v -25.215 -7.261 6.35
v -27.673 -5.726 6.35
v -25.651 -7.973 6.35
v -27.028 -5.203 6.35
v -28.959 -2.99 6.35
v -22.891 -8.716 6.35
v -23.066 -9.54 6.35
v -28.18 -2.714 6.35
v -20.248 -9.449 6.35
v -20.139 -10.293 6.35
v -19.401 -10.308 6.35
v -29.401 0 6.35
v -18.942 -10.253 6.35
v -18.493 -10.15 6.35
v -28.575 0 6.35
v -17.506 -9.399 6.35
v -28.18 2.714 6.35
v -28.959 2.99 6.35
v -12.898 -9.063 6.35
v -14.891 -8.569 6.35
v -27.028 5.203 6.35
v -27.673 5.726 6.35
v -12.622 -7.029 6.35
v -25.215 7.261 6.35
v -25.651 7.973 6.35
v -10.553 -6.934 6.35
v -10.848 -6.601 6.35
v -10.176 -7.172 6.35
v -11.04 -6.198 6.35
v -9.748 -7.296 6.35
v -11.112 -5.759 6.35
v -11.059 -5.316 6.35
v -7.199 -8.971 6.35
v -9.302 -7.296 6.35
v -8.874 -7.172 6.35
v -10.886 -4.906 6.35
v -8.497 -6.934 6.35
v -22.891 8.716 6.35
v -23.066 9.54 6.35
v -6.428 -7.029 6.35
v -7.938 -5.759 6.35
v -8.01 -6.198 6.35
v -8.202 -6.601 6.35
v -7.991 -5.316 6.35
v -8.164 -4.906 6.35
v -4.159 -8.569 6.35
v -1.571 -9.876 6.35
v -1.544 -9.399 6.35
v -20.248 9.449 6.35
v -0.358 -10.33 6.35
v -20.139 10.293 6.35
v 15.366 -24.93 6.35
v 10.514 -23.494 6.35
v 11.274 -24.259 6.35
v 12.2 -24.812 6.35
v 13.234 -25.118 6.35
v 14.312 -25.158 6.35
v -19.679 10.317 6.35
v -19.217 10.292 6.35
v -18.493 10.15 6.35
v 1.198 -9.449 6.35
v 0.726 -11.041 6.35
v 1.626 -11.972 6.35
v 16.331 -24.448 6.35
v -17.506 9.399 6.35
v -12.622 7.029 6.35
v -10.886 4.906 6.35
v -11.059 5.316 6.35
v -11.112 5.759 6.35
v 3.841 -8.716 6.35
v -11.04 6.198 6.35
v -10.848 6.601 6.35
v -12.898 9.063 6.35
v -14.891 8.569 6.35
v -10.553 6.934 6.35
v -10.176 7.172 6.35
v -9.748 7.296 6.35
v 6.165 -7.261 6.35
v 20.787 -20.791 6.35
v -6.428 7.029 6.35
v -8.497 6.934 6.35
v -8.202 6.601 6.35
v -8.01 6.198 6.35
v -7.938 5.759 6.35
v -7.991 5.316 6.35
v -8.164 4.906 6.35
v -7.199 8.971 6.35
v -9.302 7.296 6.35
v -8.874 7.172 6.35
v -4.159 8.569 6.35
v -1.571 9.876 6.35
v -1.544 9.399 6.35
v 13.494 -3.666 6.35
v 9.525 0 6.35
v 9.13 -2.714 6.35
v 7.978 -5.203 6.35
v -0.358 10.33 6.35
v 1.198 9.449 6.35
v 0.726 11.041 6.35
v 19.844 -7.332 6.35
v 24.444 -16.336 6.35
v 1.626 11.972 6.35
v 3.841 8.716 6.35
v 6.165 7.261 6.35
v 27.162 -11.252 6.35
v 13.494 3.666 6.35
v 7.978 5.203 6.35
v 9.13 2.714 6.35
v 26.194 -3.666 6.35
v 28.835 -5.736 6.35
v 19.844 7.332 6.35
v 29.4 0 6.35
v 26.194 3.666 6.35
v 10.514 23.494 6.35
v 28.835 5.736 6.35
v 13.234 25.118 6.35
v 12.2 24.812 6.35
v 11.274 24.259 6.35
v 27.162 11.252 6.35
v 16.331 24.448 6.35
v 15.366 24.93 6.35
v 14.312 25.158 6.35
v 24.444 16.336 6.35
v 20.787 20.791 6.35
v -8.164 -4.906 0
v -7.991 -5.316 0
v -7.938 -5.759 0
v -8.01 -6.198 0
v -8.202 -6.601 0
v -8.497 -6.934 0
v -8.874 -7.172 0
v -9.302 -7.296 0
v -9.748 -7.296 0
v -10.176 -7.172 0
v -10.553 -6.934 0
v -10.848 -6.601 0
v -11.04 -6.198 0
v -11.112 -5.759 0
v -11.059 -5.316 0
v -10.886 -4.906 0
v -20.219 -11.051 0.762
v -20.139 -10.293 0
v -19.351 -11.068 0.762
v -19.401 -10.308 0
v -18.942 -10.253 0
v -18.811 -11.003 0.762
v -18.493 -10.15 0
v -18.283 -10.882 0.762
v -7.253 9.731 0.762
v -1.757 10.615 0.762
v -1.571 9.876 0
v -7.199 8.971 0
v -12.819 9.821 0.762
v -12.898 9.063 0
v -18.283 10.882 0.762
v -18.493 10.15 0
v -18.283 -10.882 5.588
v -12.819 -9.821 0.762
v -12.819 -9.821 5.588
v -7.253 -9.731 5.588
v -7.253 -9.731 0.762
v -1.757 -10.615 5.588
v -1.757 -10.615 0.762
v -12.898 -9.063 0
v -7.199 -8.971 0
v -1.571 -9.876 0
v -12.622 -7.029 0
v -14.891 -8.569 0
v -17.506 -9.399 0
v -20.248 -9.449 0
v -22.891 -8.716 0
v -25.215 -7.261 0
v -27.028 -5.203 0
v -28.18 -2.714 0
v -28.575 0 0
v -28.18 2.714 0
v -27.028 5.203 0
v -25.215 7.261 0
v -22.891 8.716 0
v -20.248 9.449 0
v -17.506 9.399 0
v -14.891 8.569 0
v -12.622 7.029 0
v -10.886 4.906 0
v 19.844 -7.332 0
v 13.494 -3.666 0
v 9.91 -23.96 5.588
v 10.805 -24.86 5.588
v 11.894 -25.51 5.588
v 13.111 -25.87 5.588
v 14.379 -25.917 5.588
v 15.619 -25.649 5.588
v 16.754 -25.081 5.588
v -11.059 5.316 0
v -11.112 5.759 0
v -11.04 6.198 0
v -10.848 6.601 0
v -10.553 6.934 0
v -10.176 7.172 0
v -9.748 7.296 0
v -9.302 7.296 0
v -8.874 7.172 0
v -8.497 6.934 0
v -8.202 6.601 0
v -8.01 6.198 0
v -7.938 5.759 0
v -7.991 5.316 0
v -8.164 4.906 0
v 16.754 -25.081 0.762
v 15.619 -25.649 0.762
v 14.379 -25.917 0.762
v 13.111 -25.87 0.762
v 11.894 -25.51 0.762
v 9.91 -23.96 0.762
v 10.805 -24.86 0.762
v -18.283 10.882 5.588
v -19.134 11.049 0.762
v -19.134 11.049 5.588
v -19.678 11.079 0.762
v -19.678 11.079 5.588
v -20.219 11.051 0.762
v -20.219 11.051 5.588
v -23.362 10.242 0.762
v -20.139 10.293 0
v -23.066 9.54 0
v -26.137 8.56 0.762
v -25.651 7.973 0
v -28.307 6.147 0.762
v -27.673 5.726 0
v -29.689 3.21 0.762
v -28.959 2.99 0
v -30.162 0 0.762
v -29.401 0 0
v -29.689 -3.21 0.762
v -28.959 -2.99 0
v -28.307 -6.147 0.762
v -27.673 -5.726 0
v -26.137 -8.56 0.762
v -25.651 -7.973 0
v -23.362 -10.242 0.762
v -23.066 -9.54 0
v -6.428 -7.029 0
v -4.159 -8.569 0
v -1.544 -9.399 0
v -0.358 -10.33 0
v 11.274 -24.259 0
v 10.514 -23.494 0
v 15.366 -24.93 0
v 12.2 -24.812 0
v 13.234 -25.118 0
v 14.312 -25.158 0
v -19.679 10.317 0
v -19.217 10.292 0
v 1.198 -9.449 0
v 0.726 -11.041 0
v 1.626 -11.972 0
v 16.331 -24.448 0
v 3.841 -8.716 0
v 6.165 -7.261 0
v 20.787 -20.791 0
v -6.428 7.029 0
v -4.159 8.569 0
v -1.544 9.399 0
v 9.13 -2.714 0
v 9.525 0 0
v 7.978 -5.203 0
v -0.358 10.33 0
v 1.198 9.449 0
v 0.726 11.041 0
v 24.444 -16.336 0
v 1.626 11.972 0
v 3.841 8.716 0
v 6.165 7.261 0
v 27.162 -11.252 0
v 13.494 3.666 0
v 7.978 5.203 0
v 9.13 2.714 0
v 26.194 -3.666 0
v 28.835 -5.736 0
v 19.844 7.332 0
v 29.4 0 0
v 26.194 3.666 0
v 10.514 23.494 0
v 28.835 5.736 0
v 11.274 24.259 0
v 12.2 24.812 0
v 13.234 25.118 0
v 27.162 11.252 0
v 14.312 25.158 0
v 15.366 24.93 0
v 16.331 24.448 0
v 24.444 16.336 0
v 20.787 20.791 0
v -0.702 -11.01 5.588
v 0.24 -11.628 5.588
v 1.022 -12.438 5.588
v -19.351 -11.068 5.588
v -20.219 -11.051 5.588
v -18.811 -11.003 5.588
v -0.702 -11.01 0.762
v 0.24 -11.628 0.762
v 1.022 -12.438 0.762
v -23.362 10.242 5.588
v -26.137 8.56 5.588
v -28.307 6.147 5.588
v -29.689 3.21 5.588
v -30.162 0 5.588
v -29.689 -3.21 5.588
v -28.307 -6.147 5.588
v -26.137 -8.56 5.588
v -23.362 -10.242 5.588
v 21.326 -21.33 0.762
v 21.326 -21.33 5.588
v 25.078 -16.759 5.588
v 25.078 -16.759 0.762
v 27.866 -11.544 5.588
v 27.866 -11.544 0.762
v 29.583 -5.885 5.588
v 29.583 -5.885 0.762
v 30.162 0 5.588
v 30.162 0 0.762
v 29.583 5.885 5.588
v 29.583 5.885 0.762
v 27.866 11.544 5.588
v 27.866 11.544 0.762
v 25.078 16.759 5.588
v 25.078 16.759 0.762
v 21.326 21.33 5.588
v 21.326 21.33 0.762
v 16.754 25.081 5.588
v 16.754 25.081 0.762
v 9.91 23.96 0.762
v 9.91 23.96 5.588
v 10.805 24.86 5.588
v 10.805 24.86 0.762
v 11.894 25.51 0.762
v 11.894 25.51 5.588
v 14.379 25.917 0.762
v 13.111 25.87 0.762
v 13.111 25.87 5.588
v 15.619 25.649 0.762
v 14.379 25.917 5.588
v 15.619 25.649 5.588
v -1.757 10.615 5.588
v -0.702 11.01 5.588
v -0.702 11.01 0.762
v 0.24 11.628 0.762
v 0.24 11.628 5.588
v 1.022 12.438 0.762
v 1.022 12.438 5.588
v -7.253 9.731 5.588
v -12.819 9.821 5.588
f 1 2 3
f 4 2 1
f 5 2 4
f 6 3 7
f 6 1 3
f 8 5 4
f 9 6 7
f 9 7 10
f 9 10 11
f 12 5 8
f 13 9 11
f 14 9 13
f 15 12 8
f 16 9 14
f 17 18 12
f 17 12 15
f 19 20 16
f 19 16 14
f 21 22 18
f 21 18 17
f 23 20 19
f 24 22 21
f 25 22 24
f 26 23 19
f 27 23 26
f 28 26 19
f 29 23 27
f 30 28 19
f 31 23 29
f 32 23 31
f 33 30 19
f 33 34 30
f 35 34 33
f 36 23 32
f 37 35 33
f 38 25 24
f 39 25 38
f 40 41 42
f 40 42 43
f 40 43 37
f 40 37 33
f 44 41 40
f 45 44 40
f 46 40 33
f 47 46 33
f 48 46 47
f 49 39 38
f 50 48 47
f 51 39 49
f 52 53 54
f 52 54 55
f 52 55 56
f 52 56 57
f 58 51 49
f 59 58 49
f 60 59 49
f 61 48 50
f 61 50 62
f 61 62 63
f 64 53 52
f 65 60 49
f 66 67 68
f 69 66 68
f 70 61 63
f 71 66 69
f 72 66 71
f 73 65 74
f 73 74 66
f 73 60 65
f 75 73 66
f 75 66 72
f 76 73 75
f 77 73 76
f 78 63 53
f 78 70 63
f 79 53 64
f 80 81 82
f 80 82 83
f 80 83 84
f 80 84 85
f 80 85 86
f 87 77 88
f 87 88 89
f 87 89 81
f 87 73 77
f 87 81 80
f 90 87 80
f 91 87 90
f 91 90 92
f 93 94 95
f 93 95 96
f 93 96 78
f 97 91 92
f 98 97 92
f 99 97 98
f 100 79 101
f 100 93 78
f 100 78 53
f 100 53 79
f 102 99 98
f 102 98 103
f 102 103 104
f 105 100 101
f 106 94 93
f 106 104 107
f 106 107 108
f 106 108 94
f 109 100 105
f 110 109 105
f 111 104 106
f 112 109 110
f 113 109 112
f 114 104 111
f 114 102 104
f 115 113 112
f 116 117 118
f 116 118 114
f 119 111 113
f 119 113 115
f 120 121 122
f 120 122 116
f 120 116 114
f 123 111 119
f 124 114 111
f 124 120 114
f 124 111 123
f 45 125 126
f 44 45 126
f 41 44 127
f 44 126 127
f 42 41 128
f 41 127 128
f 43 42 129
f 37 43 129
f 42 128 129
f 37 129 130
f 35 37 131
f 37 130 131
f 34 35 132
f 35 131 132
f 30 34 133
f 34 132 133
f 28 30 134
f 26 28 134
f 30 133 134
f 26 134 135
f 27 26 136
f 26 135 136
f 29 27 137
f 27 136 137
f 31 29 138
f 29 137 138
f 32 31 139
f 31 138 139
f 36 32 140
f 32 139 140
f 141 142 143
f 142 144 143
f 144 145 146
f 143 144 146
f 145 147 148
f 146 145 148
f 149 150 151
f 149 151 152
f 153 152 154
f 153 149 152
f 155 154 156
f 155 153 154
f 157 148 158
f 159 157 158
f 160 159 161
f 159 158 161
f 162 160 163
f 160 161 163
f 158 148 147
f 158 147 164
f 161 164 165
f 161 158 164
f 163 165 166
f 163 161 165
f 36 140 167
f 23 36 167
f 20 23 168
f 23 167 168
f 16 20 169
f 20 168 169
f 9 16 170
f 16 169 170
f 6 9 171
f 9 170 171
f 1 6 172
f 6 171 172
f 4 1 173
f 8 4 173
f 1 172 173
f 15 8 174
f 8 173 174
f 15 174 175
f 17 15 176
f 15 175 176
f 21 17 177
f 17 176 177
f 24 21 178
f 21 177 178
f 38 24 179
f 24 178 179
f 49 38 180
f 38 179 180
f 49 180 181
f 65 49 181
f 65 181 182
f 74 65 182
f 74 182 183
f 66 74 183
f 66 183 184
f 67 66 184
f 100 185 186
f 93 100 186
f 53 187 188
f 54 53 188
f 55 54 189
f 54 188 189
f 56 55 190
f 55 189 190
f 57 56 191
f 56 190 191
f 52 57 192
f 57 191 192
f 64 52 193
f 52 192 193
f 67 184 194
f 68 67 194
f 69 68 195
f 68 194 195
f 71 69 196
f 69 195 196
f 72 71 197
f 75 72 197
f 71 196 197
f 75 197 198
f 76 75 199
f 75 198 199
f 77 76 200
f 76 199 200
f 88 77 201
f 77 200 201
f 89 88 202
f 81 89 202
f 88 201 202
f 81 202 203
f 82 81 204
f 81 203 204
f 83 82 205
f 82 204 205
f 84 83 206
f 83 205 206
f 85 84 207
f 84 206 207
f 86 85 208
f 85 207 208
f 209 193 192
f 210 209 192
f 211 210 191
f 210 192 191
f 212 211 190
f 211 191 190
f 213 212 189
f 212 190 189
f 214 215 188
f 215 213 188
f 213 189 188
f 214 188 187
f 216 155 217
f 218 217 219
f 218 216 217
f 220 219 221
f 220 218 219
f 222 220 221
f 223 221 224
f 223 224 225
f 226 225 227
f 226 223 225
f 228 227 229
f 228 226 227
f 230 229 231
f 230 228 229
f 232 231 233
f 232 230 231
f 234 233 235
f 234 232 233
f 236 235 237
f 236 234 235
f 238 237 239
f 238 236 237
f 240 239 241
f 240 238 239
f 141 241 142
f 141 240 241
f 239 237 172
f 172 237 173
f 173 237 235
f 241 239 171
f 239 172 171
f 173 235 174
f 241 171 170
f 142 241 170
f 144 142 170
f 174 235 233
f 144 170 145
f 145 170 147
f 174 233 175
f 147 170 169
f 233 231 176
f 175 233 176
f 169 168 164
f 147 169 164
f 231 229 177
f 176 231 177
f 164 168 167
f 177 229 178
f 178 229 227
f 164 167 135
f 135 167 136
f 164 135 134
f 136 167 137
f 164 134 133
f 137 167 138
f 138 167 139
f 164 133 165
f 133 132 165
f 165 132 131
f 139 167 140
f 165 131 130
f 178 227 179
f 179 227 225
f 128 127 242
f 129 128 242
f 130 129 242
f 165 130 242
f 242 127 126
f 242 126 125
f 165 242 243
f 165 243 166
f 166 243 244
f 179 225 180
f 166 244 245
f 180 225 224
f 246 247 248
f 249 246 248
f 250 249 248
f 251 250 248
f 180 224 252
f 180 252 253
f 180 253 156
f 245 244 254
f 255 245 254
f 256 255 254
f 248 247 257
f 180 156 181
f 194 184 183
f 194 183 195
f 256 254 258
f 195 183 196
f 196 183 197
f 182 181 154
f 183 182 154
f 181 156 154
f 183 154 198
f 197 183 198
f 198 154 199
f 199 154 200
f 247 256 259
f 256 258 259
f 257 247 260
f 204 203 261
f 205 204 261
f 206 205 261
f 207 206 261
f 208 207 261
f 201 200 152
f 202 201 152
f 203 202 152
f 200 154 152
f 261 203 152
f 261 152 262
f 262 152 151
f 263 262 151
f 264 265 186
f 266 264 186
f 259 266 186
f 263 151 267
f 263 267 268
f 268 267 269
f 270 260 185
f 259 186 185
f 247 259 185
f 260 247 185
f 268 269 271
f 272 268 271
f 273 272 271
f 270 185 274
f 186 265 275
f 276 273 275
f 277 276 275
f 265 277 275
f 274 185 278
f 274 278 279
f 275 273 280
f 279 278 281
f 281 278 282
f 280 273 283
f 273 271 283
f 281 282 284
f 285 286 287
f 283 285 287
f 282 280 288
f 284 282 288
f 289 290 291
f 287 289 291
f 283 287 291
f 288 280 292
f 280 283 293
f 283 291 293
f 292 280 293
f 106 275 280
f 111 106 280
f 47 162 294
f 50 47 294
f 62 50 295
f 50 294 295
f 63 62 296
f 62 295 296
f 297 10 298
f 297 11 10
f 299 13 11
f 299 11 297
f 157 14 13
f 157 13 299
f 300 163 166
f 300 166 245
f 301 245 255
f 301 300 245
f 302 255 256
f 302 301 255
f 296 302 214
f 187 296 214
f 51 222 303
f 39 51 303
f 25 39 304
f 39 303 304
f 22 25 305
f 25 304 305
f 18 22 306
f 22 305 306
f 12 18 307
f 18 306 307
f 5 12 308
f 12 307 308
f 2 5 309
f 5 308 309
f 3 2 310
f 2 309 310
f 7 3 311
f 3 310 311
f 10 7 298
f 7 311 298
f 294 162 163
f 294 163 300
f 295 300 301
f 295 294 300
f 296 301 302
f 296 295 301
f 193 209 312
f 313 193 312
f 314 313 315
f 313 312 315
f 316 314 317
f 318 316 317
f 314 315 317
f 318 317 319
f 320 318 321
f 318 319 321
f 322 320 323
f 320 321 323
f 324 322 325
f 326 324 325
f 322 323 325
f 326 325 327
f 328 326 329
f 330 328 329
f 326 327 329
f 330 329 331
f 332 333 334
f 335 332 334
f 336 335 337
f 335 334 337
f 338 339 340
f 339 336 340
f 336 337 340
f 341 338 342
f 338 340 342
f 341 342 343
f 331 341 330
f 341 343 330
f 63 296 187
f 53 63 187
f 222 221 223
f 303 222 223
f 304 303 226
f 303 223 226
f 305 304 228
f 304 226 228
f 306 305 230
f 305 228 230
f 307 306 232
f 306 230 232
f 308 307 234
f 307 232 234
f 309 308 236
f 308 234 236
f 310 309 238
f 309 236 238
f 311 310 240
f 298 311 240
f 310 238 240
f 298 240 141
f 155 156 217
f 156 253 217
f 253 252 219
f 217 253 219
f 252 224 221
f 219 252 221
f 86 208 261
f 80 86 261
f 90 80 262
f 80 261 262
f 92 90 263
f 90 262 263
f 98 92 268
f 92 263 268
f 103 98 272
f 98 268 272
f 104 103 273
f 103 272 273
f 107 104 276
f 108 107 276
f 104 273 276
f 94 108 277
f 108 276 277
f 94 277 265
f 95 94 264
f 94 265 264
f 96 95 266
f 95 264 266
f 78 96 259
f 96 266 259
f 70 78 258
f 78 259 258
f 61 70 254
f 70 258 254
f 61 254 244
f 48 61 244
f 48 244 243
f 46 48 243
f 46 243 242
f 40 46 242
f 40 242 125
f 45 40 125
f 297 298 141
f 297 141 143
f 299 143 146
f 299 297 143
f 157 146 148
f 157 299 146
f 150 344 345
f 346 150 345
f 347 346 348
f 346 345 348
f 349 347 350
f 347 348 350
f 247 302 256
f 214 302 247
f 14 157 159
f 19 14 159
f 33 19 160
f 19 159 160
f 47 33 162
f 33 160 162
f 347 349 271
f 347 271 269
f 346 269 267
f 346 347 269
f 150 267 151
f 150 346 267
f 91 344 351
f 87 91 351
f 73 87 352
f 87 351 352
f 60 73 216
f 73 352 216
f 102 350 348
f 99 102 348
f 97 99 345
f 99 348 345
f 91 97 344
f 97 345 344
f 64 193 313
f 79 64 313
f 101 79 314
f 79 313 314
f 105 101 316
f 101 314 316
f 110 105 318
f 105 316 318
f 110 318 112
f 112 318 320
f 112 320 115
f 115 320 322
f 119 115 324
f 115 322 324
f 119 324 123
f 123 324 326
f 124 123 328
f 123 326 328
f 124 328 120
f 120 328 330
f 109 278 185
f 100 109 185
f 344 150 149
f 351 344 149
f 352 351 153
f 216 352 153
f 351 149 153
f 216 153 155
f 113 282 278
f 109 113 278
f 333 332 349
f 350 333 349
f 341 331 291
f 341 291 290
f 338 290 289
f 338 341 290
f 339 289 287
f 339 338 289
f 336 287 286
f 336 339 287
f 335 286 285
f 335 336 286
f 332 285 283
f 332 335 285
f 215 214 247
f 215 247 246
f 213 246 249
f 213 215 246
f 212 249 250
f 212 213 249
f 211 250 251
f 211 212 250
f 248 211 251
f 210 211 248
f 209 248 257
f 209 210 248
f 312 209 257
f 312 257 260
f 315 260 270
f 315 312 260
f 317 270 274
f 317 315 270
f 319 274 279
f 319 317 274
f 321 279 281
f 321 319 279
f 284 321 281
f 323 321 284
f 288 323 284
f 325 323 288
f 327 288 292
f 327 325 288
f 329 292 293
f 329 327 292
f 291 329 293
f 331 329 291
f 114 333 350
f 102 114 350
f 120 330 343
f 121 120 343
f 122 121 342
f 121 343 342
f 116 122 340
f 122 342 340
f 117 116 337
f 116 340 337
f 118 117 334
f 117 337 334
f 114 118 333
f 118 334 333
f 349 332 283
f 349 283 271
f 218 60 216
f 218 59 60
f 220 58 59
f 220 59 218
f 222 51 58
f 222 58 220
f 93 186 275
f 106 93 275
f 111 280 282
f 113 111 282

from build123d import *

# Parameters (mm, degrees)
F1_DEPTH = 6.35
F2_R     = 5.08
F3_SIZE  = 0.762


with BuildPart() as f1:
    # F0 (on Top) → F1 (new body)
    with BuildSketch(Plane.XY):
        with BuildLine():
            ThreePointArc((0, 11.1125), (-9.525, 9.650069645), (-19.05, 11.1125))
            ThreePointArc((-19.05, 11.1125), (-30.1625, 0), (-19.05, -11.1125))
            ThreePointArc((-19.05, -11.1125), (-9.525, -9.650069645), (0, -11.1125))
            Line((0, -11.1125), (12.5760834642, -27.4156621469))
            ThreePointArc((12.5760834642, -27.4156621469), (30.1625, 0), (12.5760834642, 27.4156621469))
            Line((12.5760834642, 27.4156621469), (0, 11.1125))
        make_face()
        Polygon((19.84375, -7.3323484187), (13.49375, -3.6661742094), (13.49375, 3.6661742094), (19.84375, 7.3323484187), (26.19375, 3.6661742094), (26.19375, -3.6661742094), align=None, mode=Mode.SUBTRACT)
        with BuildLine():
            ThreePointArc((-8.1642857143, 4.9061251284), (9.525, 0), (-8.1642857143, -4.9061251284))
            ThreePointArc((-8.1642857143, -4.9061251284), (-9.525, -7.3113126498), (-10.8857142857, -4.9061251284))
            ThreePointArc((-10.8857142857, -4.9061251284), (-28.575, 0), (-10.8857142857, 4.9061251284))
            ThreePointArc((-10.8857142857, 4.9061251284), (-9.525, 7.3113126498), (-8.1642857143, 4.9061251284))
        make_face(mode=Mode.SUBTRACT)
    extrude(amount=F1_DEPTH)

    # F2
    f2_edges = [f1.edges().sort_by_distance(p)[0] for p in [
        (12.576083, 27.415662, 3.175),
        (0, 11.1125, 3.175),
        (-19.05, 11.1125, 3.175),
        (-19.05, -11.1125, 3.175),
        (0, -11.1125, 3.175),
        (12.576083, -27.415662, 3.175),
    ]]
    fillet(f2_edges, radius=F2_R)

    # F3
    f3_edges = [f1.edges().sort_by_distance(p)[0] for p in [
        (30.1625, 0, 6.35),
        (30.1625, 0, 0),
        (5.466288, 18.198791, 0),
        (5.466288, 18.198791, 6.35),
        (13.111177, 25.870157, 0),
        (-0.214116, 11.292614, 0),
        (-10.037859, 9.654212, 0),
        (13.111177, -25.870157, 0),
        (-19.242874, 11.059803, 0),
        (5.466288, -18.198791, 0),
        (-30.1625, 0, 0),
        (-0.214116, -11.292614, 0),
        (-19.242874, -11.059803, 0),
        (-10.037859, -9.654212, 0),
        (13.111177, 25.870157, 6.35),
        (-0.214116, 11.292614, 6.35),
        (-10.037859, 9.654212, 6.35),
        (13.111177, -25.870157, 6.35),
        (-19.242874, 11.059803, 6.35),
        (5.466288, -18.198791, 6.35),
        (-30.1625, 0, 6.35),
        (-0.214116, -11.292614, 6.35),
        (-19.242874, -11.059803, 6.35),
        (-10.037859, -9.654212, 6.35),
    ]]
    chamfer(f3_edges, length=F3_SIZE)


solid = f1.part
